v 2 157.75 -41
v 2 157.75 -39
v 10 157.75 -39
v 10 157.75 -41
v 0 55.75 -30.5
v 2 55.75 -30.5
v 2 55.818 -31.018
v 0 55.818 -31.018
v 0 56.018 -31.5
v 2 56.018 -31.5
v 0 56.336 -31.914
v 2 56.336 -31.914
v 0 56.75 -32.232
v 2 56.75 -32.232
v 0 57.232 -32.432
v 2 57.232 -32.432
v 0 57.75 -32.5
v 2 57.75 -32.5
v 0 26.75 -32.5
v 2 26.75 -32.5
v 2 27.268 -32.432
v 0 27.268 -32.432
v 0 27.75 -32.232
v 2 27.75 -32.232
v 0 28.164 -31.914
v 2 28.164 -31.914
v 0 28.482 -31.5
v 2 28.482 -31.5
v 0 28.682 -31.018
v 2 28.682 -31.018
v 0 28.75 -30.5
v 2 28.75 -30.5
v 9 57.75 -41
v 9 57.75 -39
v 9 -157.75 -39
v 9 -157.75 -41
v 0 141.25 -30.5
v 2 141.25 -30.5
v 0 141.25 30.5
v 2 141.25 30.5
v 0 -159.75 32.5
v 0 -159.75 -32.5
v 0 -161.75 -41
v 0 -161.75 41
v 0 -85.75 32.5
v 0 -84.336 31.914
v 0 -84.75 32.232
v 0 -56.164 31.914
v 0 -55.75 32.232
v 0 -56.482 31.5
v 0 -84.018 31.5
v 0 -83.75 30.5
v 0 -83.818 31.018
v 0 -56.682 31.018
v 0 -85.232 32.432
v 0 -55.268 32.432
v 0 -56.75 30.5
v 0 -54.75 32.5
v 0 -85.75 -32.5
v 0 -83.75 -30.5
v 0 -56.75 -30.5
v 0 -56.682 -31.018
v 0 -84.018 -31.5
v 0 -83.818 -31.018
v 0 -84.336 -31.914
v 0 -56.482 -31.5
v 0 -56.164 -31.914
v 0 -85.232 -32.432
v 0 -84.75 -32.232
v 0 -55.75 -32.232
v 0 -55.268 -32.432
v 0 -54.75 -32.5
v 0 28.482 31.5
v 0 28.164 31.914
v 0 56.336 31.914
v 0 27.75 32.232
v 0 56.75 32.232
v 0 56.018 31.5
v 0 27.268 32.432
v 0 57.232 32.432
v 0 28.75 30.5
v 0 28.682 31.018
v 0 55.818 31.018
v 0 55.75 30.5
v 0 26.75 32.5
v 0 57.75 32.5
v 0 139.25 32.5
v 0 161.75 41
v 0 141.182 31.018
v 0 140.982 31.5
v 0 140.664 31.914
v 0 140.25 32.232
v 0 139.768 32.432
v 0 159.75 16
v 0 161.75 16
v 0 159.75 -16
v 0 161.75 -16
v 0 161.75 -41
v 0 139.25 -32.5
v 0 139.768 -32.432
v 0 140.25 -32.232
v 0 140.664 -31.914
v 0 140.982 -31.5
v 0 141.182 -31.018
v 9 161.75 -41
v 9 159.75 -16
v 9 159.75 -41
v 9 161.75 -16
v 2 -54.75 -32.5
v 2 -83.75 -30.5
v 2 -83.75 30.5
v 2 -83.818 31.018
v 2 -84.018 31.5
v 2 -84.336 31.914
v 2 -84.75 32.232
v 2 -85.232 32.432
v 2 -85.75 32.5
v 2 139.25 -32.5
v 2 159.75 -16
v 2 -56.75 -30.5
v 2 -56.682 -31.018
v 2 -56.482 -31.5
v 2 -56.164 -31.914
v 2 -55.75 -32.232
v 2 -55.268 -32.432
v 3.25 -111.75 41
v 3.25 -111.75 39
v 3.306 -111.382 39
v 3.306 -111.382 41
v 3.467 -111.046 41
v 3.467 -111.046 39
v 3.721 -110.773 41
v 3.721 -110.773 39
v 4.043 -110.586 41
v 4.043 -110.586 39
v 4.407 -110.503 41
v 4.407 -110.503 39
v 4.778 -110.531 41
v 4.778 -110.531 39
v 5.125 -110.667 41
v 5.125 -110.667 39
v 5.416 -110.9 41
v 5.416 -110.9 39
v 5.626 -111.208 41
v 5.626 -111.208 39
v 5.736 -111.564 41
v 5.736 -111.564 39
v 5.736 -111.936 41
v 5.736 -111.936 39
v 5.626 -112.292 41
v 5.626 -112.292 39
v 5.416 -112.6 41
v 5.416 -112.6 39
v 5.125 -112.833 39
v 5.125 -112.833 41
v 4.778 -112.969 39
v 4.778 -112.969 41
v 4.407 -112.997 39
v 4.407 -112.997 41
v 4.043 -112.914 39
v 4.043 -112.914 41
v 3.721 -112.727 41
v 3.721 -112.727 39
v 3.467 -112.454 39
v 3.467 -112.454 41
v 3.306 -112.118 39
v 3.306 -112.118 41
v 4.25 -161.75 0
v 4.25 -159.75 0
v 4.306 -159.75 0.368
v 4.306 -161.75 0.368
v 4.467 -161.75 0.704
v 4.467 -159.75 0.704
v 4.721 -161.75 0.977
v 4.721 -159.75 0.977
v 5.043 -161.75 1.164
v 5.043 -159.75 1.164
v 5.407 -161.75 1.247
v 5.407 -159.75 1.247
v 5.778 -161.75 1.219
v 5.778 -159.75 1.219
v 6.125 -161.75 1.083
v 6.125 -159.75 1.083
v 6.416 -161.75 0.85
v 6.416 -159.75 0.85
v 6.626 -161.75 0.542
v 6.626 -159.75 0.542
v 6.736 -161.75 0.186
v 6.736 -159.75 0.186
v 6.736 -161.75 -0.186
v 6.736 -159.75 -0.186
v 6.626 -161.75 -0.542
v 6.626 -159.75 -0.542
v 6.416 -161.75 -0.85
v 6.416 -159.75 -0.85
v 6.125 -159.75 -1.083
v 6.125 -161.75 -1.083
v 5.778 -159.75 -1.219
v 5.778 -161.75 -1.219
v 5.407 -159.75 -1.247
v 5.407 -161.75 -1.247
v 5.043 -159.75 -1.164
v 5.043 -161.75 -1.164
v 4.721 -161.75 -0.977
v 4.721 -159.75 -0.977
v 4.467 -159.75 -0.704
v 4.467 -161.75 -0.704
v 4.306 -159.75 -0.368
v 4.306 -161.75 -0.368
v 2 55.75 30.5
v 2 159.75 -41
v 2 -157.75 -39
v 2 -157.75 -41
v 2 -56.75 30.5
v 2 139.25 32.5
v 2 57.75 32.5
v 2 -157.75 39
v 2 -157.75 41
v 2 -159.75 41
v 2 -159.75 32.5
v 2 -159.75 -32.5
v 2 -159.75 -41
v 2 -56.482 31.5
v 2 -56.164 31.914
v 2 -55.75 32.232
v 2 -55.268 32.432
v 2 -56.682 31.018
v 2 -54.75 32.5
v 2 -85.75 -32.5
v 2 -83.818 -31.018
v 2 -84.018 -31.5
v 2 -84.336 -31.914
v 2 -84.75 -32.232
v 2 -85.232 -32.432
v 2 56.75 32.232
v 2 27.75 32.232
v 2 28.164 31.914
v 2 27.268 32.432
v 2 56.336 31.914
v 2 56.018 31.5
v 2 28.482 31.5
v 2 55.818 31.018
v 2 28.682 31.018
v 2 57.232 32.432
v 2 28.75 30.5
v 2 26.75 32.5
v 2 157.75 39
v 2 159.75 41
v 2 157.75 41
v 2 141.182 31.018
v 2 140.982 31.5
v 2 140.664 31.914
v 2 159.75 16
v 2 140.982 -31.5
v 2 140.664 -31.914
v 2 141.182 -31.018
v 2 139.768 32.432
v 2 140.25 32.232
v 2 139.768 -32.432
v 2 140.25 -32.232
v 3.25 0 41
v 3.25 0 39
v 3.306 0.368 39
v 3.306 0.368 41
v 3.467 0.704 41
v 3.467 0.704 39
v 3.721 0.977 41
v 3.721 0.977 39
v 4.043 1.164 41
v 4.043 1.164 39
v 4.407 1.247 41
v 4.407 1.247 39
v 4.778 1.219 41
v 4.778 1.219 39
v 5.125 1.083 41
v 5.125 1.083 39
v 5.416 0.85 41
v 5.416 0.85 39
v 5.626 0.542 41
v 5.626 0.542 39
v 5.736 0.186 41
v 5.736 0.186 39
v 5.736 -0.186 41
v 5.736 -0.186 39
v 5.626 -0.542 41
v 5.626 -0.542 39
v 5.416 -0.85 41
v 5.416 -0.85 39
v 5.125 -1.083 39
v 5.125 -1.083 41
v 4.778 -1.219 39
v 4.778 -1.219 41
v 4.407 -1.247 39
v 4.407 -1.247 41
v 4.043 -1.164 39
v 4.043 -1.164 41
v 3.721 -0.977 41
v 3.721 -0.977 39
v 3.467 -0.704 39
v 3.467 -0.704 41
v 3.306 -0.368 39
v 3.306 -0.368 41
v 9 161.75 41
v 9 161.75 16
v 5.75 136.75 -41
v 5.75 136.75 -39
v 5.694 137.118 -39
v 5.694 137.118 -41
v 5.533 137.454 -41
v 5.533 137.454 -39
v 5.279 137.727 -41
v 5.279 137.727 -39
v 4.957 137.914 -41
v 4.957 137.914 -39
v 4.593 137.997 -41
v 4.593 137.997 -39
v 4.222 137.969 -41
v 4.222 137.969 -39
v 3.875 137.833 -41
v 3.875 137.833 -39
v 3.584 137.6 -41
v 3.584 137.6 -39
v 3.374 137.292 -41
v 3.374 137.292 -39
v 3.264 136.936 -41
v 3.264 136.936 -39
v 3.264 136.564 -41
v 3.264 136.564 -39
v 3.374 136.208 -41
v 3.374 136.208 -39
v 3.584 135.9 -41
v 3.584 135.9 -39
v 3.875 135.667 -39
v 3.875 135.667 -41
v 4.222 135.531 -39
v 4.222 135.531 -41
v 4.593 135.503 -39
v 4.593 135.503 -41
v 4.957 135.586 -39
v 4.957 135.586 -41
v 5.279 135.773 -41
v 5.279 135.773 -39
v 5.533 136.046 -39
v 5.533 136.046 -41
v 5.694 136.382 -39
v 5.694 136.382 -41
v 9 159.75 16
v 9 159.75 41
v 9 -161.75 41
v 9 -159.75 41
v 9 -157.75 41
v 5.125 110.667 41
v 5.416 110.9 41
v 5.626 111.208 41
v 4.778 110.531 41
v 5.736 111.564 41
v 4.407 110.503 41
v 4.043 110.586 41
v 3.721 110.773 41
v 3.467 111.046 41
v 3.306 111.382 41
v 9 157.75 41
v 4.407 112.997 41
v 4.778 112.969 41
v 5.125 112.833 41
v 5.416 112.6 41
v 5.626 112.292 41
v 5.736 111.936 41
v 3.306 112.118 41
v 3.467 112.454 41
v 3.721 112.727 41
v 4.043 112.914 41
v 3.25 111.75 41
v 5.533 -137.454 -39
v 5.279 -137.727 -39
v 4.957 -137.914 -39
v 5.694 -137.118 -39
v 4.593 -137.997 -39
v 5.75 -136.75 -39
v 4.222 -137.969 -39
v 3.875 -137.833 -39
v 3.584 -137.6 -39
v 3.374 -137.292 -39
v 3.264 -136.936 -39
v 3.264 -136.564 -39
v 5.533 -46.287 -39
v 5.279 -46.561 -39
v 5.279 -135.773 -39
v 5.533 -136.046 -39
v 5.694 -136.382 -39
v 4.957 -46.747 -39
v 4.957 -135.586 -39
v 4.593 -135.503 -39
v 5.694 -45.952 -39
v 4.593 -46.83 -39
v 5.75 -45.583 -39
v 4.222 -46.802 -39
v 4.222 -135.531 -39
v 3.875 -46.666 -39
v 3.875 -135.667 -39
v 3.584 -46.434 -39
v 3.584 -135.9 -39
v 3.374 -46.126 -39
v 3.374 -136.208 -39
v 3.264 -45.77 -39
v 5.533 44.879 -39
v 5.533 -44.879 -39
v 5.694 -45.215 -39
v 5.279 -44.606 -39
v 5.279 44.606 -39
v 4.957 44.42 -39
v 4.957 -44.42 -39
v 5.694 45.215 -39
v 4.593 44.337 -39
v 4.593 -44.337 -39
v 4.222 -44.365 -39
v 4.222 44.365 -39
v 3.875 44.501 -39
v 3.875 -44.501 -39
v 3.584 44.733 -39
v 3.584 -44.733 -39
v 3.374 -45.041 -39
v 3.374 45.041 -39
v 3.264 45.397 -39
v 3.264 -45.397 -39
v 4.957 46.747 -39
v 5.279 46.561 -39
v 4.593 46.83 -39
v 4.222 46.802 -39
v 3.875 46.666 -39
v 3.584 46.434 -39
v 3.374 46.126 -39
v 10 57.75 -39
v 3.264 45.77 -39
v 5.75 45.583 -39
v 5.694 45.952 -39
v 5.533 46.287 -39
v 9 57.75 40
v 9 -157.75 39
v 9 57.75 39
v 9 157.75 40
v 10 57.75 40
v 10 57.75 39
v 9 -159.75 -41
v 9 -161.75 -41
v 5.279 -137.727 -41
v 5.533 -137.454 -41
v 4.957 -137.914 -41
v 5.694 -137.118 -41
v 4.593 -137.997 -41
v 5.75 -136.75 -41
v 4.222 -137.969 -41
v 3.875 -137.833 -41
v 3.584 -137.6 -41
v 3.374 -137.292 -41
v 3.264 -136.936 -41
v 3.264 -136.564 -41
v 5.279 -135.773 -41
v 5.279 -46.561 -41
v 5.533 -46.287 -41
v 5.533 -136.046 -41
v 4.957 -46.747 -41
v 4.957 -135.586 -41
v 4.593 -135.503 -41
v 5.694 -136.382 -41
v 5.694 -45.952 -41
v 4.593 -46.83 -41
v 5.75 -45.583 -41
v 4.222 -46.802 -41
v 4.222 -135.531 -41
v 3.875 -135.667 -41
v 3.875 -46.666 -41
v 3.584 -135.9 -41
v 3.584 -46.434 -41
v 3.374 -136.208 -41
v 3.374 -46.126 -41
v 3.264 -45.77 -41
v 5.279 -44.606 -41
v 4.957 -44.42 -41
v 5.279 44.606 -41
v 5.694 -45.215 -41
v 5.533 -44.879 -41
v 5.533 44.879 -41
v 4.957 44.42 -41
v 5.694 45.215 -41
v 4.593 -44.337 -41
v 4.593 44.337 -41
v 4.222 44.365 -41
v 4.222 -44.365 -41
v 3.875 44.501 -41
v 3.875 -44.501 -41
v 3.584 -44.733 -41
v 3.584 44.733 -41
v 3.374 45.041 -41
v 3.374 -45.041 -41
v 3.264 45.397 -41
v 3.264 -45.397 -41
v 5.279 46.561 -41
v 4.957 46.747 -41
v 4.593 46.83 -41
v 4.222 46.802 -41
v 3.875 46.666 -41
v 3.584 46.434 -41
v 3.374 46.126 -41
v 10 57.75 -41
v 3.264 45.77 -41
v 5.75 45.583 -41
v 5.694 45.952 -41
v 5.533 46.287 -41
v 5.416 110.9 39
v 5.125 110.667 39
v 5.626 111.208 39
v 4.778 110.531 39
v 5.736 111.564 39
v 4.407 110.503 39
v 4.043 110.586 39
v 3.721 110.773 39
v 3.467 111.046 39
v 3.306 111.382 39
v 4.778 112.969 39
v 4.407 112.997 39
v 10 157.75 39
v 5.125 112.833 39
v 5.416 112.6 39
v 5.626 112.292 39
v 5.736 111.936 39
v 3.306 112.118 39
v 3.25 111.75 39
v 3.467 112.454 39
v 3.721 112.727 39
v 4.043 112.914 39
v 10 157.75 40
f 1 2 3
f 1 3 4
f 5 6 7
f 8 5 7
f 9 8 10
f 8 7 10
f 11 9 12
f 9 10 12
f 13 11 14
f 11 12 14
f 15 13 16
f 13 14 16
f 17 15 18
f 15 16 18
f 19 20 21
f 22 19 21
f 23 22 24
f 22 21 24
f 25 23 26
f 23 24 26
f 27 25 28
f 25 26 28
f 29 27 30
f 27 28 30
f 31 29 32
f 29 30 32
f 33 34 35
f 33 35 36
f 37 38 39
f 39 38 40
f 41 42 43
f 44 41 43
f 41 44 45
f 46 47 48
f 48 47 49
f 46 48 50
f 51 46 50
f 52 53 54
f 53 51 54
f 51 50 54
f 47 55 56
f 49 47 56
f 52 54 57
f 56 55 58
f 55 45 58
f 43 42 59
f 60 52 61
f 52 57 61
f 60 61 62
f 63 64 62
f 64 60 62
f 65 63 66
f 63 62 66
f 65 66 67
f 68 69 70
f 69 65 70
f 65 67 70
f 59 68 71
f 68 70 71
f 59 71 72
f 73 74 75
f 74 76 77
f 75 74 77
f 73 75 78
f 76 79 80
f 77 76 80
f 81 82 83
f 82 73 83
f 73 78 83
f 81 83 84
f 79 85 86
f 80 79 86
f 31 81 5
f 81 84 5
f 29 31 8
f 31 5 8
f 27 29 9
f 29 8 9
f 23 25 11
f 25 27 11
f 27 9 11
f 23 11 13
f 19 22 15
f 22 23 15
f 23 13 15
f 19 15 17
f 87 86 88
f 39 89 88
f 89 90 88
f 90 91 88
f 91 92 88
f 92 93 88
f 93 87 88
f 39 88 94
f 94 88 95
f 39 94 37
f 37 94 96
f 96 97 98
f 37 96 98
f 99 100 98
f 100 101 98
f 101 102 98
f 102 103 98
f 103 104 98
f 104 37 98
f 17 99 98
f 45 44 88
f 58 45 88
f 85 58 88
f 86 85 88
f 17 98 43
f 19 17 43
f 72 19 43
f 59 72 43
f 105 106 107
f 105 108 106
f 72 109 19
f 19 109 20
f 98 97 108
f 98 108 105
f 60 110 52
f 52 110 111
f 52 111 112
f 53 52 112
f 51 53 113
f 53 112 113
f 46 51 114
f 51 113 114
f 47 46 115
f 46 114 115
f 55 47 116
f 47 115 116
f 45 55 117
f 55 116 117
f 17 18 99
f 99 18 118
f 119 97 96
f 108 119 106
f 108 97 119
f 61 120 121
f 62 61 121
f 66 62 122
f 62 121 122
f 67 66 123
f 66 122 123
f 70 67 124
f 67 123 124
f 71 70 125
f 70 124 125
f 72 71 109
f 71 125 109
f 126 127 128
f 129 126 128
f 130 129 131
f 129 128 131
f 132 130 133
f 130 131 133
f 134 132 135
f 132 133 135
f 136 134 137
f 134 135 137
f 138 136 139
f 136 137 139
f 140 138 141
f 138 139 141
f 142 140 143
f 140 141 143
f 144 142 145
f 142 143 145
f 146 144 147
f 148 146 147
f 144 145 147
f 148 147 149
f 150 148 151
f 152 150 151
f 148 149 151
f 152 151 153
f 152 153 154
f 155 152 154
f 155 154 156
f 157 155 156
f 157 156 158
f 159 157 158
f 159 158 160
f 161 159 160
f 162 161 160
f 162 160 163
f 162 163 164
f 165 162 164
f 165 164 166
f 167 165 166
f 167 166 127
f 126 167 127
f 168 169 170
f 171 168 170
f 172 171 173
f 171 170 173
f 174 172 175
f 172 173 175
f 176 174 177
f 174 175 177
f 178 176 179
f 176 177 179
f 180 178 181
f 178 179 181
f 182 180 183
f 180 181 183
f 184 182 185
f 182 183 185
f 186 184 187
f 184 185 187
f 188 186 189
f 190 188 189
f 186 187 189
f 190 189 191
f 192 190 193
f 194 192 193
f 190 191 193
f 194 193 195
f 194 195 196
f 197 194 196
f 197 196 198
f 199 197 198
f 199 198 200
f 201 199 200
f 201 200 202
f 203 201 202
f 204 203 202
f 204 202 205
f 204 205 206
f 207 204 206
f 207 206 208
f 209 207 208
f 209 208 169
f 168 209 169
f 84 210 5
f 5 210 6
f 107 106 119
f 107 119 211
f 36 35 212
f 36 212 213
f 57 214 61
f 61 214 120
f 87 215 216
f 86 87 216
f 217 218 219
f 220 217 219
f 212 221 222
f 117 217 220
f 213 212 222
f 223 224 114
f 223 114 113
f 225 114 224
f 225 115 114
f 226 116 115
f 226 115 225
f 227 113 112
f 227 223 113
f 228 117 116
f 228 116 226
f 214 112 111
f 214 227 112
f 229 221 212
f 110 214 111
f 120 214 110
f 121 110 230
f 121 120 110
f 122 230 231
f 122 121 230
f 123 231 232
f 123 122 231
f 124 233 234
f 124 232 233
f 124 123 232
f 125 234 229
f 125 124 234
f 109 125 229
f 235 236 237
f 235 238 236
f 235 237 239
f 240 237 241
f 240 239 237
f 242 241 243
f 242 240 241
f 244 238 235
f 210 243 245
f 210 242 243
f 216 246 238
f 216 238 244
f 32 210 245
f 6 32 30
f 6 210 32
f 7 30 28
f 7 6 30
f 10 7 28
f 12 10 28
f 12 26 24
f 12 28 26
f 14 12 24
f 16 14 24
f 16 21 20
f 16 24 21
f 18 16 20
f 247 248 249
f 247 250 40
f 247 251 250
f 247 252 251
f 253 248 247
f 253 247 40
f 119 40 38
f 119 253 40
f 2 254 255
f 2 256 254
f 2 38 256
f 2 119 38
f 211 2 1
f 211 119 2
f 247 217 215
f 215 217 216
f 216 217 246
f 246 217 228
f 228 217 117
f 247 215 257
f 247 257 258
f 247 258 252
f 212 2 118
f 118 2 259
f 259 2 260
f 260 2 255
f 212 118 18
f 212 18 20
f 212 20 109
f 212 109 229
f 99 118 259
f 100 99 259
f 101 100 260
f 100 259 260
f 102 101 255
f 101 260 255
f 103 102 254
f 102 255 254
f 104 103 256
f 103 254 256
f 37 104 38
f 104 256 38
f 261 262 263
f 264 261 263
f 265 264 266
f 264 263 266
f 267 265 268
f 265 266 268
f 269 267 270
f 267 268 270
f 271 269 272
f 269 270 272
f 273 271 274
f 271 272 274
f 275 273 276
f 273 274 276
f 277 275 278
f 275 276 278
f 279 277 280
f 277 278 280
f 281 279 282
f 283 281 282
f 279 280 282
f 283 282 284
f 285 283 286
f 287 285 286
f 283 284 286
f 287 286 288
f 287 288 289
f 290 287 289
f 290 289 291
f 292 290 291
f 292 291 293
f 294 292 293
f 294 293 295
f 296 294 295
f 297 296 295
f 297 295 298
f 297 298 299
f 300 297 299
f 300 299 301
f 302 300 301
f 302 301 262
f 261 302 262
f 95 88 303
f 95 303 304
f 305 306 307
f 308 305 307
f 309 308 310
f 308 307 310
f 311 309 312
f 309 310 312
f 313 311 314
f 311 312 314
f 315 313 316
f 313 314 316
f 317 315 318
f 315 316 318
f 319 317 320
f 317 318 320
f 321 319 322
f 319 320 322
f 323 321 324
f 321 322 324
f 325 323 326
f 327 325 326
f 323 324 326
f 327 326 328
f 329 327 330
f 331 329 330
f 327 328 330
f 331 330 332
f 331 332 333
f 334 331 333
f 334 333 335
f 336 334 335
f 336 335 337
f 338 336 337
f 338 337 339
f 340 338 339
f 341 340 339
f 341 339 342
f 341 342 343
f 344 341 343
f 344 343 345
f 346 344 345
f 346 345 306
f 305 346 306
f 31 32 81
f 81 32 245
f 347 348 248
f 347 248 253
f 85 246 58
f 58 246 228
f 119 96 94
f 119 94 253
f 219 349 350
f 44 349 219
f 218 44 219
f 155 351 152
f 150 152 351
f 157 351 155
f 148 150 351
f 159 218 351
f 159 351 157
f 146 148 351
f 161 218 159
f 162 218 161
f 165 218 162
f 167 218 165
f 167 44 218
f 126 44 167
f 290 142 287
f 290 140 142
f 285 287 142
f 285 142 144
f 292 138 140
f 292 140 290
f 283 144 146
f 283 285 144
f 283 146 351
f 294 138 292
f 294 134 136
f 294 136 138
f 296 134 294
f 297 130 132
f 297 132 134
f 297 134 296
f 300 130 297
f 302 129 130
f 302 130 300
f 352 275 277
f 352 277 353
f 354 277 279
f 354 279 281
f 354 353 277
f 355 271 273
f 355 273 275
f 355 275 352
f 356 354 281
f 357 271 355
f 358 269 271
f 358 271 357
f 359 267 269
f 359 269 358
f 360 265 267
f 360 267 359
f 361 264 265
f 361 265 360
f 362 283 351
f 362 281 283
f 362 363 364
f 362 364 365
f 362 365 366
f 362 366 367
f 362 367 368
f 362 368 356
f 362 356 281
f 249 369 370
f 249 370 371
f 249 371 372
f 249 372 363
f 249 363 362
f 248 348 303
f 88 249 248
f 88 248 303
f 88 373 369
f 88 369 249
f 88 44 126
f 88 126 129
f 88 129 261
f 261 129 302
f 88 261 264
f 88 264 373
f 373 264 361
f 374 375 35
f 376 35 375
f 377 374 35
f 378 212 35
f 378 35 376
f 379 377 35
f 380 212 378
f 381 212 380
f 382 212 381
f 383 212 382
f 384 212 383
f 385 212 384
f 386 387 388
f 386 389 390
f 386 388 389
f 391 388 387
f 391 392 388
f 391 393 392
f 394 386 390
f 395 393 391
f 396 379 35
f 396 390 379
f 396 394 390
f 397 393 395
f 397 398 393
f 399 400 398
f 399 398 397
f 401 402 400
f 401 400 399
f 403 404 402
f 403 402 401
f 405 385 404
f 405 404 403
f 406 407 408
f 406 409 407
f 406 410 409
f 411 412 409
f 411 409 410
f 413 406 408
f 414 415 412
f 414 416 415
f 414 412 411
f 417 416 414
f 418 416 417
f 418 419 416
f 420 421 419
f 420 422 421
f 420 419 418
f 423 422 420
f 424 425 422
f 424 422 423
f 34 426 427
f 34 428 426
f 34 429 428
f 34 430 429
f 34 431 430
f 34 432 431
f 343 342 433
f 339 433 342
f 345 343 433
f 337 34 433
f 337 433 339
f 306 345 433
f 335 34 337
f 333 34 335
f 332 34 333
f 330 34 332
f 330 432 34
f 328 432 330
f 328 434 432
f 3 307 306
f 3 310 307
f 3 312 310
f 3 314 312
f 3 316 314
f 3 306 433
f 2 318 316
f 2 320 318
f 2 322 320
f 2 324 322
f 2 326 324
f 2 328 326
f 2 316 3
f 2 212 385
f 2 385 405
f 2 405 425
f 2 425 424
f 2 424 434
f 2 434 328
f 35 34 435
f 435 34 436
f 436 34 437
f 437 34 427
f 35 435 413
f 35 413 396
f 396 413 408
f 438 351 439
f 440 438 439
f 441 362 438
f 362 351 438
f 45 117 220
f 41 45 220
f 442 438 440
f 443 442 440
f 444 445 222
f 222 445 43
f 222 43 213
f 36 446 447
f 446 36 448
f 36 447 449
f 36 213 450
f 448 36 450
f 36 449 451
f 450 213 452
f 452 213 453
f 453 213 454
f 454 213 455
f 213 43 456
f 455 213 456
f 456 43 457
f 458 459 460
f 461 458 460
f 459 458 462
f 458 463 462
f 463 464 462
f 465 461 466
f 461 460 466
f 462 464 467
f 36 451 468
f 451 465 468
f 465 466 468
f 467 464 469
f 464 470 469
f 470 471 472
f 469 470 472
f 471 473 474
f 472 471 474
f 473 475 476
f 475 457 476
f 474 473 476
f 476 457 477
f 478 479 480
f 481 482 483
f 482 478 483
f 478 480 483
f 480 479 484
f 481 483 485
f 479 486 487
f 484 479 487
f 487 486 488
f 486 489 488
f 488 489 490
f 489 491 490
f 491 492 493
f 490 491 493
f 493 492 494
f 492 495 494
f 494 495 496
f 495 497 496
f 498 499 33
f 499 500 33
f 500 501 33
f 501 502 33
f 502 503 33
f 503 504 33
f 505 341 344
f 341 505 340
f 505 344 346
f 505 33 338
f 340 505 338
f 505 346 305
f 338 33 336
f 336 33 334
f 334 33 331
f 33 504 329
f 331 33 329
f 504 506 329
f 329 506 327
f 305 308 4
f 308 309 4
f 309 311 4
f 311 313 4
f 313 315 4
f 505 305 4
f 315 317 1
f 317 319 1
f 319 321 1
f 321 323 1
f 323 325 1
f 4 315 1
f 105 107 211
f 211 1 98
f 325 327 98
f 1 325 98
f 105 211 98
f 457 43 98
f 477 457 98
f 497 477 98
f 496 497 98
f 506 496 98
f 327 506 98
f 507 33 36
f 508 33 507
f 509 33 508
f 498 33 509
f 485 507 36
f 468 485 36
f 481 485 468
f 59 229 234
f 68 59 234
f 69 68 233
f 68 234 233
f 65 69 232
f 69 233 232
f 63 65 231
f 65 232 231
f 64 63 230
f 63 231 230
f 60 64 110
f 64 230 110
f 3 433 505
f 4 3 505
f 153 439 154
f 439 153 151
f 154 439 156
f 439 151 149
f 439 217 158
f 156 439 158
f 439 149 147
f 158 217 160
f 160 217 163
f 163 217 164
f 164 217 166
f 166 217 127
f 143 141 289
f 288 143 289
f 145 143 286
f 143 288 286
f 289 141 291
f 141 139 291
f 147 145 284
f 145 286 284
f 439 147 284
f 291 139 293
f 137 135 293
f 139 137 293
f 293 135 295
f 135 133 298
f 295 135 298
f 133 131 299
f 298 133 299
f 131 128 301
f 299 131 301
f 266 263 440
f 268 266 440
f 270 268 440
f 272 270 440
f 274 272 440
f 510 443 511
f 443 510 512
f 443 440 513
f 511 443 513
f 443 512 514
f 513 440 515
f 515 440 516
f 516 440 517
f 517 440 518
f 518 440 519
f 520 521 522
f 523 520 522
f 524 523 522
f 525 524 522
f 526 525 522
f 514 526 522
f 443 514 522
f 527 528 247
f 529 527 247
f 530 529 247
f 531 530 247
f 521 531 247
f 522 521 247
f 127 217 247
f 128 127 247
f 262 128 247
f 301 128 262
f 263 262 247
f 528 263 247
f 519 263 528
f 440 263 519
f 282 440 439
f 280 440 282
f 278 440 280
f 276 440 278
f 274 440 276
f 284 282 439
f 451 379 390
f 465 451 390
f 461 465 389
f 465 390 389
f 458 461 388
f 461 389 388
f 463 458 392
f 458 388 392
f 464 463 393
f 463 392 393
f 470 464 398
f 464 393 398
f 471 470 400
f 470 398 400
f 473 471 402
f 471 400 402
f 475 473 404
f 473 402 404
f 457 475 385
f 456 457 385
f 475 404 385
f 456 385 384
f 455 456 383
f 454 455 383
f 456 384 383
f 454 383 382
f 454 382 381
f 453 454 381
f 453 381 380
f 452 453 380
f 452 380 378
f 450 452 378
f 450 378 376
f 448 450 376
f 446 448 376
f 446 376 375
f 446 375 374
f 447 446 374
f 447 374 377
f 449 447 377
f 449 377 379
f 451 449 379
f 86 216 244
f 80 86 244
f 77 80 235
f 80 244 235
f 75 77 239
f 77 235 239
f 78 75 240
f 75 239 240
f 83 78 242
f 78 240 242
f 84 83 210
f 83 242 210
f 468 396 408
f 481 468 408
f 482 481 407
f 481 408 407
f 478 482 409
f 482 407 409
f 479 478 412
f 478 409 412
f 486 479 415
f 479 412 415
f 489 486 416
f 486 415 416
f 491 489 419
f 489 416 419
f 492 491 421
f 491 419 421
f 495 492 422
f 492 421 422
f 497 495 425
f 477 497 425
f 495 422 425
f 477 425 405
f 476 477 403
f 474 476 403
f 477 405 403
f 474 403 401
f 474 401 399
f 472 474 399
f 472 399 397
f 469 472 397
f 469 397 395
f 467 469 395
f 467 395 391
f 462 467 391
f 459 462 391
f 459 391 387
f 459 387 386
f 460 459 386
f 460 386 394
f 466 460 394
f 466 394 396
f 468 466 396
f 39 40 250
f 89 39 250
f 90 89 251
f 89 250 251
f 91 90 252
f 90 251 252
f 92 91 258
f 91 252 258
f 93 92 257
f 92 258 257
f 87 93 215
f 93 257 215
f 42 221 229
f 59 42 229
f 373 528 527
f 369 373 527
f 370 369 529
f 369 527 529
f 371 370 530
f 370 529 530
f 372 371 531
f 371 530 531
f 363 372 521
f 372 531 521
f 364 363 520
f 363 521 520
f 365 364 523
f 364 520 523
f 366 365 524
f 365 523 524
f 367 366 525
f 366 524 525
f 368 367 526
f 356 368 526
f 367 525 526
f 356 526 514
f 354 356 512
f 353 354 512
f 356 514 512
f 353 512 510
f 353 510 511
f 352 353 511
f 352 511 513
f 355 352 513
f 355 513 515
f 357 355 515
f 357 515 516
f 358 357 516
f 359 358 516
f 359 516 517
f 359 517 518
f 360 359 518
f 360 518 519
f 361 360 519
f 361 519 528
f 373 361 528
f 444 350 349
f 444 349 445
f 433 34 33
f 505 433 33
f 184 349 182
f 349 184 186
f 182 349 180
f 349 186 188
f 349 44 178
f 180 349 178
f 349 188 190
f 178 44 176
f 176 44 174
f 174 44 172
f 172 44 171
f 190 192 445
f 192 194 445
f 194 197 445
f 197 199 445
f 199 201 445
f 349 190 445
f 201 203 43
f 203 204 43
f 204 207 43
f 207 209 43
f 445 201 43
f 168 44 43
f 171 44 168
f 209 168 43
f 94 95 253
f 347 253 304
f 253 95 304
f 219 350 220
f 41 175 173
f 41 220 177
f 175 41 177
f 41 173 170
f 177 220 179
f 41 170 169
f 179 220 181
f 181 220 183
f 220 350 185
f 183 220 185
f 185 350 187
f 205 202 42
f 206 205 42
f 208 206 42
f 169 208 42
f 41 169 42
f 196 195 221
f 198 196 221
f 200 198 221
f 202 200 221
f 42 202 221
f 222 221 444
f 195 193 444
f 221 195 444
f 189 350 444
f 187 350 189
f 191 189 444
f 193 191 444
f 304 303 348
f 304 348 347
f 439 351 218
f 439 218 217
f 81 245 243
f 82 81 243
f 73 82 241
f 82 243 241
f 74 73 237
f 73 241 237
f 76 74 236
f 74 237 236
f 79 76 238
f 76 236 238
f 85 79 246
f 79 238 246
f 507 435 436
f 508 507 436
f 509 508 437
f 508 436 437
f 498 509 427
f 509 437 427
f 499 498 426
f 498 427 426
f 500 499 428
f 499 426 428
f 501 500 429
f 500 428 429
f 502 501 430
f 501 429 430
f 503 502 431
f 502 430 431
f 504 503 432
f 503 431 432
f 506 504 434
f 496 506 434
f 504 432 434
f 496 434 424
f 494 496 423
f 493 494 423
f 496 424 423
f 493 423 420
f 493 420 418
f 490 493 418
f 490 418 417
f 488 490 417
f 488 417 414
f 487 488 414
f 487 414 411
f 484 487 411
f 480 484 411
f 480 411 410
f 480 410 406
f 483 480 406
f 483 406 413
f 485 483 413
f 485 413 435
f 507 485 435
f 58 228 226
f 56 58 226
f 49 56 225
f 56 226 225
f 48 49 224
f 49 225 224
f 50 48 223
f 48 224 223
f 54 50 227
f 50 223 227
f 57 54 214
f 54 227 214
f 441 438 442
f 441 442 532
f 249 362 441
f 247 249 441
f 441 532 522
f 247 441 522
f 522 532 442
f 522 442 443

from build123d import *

# Parameters (mm, degrees)
SKETCH1_W                                     = 82
SKETCH1_H                                     = 323.5
BASE_EXTRUSION_DEPTH                          = 2
ACCESS_PORTS_DEPTH                            = 167.877387623
SKETCH4_W                                     = 82
SKETCH4_H                                     = 323.5
SKETCH4_W_2                                   = 78
SKETCH4_H_2                                   = 319.5
CORNER_RAIL_MOUNTS_DEPTH                      = 7
M3X0_5_TAPPED_HOLE_FOR_END_D                  = 2.5
M3X0_5_TAPPED_HOLE_FOR_END_DEPTH              = 2
SKETCH14_W                                    = 9
SKETCH14_H                                    = 32
ANTENNA_CUTOUT_DEPTH                          = 2
SKETCH15_W                                    = 2
SKETCH15_H                                    = 2
SLITS_IN_CORNERS_DEPTH                        = 7
M3X0_5_TAPPED_HOLES_FOR_RAILS_D               = 2.5
M3X0_5_TAPPED_HOLES_FOR_RAILS_DEPTH           = 2
M3X0_5_TAPPED_HOLES_FOR_RAILS_ON_FACE_2_D     = 2.5
M3X0_5_TAPPED_HOLES_FOR_RAILS_ON_FACE_2_DEPTH = 2
SKETCH17_W                                    = 2
SKETCH17_H                                    = 100
SKETCH17_W_2                                  = 1
SUPPORT_FOR_PAYLOAD_DEPTH                     = 1


with BuildPart() as part:
    # Sketch1 → Base Extrusion (new body)
    with BuildSketch(Plane(origin=(0, 0, 0), x_dir=(0, 0, -1), z_dir=(1, 0, 0))):
        Rectangle(SKETCH1_W, SKETCH1_H)
    extrude(amount=BASE_EXTRUSION_DEPTH)

    # Sketch8 → Access Ports (cut, through all)
    with BuildSketch(Plane(origin=(2, 0, 0), x_dir=(0, 0, -1), z_dir=(1, 0, 0))):
        with BuildLine():
            Line((-30.5, 55.75), (30.5, 55.75))
            ThreePointArc((30.5, 55.75), (31.914213562, 56.335786438), (32.5, 57.75))
            Line((32.5, 57.75), (32.5, 139.25))
            ThreePointArc((32.5, 139.25), (31.914213562, 140.664213562), (30.5, 141.25))
            Line((30.5, 141.25), (-30.5, 141.25))
            ThreePointArc((-30.5, 141.25), (-31.914213562, 140.664213562), (-32.5, 139.25))
            Line((-32.5, 139.25), (-32.5, 57.75))
            ThreePointArc((-32.5, 57.75), (-31.914213562, 56.335786438), (-30.5, 55.75))
        make_face()
        with BuildLine():
            Line((-30.5, -56.75), (30.5, -56.75))
            ThreePointArc((30.5, -56.75), (31.914213562, -56.164213562), (32.5, -54.75))
            Line((32.5, -54.75), (32.5, 26.75))
            ThreePointArc((32.5, 26.75), (31.914213562, 28.164213562), (30.5, 28.75))
            Line((30.5, 28.75), (-30.5, 28.75))
            ThreePointArc((-30.5, 28.75), (-31.914213562, 28.164213562), (-32.5, 26.75))
            Line((-32.5, 26.75), (-32.5, -54.75))
            ThreePointArc((-32.5, -54.75), (-31.914213562, -56.164213562), (-30.5, -56.75))
        make_face()
        with BuildLine():
            Line((-32.5, -159.75), (32.5, -159.75))
            Line((32.5, -159.75), (32.5, -85.75))
            ThreePointArc((32.5, -85.75), (31.914213562, -84.335786438), (30.5, -83.75))
            Line((30.5, -83.75), (-30.5, -83.75))
            ThreePointArc((-30.5, -83.75), (-31.914213562, -84.335786438), (-32.5, -85.75))
            Line((-32.5, -85.75), (-32.5, -159.75))
        make_face()
    extrude(amount=-ACCESS_PORTS_DEPTH, mode=Mode.SUBTRACT)

    # Sketch4 → Corner Rail Mounts (add)
    with BuildSketch(Plane(origin=(2, 0, 0), x_dir=(0, 0, -1), z_dir=(1, 0, 0))):
        Rectangle(SKETCH4_W, SKETCH4_H)
        Rectangle(SKETCH4_W_2, SKETCH4_H_2, mode=Mode.SUBTRACT)
    extrude(amount=CORNER_RAIL_MOUNTS_DEPTH)

    # M3x0.5 Tapped Hole For End
    with Locations(Plane.XZ.offset(161.75)):
        with Locations((5.5, 0)):
            Hole(M3X0_5_TAPPED_HOLE_FOR_END_D / 2, depth=M3X0_5_TAPPED_HOLE_FOR_END_DEPTH)

    # Sketch14 → Antenna Cutout (cut)
    with BuildSketch(Plane(origin=(0, 161.75, 0), x_dir=(1, 0, 0), z_dir=(0, 1, 0))):
        with Locations((4.5, 0)):
            Rectangle(SKETCH14_W, SKETCH14_H)
    extrude(amount=-ANTENNA_CUTOUT_DEPTH, mode=Mode.SUBTRACT)

    # Sketch15 → Slits In Corners (cut)
    with BuildSketch(Plane(origin=(9, 0, 0), x_dir=(0, 0, -1), z_dir=(1, 0, 0))):
        with Locations((-40, -158.75)):
            Rectangle(SKETCH15_W, SKETCH15_H)
        with Locations((40, -158.75)):
            Rectangle(SKETCH15_W, SKETCH15_H)
        with Locations((40, 158.75)):
            Rectangle(SKETCH15_W, SKETCH15_H)
        with Locations((-40, 158.75)):
            Rectangle(SKETCH15_W, SKETCH15_H)
    extrude(amount=-SLITS_IN_CORNERS_DEPTH, mode=Mode.SUBTRACT)

    # M3x0.5 Tapped Holes For Rails
    with Locations(Plane(origin=(4.5, 136.75, -41), x_dir=(-1, 0, 0), z_dir=(0, 0, -1))):
        with Locations((0, 0), (0, -91.166666667), (0, -182.333333333), (0, -273.5)):
            Hole(M3X0_5_TAPPED_HOLES_FOR_RAILS_D / 2, depth=M3X0_5_TAPPED_HOLES_FOR_RAILS_DEPTH)

    # M3x0.5 Tapped Holes For Rails on face 2
    with Locations(Plane(origin=(4.5, 111.75, 41), x_dir=(1, 0, 0), z_dir=(0, 0, 1))):
        with Locations((0, 0), (0, -111.75), (0, -223.5)):
            Hole(M3X0_5_TAPPED_HOLES_FOR_RAILS_ON_FACE_2_D / 2, depth=M3X0_5_TAPPED_HOLES_FOR_RAILS_ON_FACE_2_DEPTH)

    # Sketch17 → Support For Payload (add)
    with BuildSketch(Plane(origin=(9, 0, 0), x_dir=(0, 0, -1), z_dir=(1, 0, 0))):
        with Locations((40, 107.75)):
            Rectangle(SKETCH17_W, SKETCH17_H)
        with Locations((-39.5, 107.75)):
            Rectangle(SKETCH17_W_2, SKETCH17_H)
    extrude(amount=SUPPORT_FOR_PAYLOAD_DEPTH)


solid = part.part
